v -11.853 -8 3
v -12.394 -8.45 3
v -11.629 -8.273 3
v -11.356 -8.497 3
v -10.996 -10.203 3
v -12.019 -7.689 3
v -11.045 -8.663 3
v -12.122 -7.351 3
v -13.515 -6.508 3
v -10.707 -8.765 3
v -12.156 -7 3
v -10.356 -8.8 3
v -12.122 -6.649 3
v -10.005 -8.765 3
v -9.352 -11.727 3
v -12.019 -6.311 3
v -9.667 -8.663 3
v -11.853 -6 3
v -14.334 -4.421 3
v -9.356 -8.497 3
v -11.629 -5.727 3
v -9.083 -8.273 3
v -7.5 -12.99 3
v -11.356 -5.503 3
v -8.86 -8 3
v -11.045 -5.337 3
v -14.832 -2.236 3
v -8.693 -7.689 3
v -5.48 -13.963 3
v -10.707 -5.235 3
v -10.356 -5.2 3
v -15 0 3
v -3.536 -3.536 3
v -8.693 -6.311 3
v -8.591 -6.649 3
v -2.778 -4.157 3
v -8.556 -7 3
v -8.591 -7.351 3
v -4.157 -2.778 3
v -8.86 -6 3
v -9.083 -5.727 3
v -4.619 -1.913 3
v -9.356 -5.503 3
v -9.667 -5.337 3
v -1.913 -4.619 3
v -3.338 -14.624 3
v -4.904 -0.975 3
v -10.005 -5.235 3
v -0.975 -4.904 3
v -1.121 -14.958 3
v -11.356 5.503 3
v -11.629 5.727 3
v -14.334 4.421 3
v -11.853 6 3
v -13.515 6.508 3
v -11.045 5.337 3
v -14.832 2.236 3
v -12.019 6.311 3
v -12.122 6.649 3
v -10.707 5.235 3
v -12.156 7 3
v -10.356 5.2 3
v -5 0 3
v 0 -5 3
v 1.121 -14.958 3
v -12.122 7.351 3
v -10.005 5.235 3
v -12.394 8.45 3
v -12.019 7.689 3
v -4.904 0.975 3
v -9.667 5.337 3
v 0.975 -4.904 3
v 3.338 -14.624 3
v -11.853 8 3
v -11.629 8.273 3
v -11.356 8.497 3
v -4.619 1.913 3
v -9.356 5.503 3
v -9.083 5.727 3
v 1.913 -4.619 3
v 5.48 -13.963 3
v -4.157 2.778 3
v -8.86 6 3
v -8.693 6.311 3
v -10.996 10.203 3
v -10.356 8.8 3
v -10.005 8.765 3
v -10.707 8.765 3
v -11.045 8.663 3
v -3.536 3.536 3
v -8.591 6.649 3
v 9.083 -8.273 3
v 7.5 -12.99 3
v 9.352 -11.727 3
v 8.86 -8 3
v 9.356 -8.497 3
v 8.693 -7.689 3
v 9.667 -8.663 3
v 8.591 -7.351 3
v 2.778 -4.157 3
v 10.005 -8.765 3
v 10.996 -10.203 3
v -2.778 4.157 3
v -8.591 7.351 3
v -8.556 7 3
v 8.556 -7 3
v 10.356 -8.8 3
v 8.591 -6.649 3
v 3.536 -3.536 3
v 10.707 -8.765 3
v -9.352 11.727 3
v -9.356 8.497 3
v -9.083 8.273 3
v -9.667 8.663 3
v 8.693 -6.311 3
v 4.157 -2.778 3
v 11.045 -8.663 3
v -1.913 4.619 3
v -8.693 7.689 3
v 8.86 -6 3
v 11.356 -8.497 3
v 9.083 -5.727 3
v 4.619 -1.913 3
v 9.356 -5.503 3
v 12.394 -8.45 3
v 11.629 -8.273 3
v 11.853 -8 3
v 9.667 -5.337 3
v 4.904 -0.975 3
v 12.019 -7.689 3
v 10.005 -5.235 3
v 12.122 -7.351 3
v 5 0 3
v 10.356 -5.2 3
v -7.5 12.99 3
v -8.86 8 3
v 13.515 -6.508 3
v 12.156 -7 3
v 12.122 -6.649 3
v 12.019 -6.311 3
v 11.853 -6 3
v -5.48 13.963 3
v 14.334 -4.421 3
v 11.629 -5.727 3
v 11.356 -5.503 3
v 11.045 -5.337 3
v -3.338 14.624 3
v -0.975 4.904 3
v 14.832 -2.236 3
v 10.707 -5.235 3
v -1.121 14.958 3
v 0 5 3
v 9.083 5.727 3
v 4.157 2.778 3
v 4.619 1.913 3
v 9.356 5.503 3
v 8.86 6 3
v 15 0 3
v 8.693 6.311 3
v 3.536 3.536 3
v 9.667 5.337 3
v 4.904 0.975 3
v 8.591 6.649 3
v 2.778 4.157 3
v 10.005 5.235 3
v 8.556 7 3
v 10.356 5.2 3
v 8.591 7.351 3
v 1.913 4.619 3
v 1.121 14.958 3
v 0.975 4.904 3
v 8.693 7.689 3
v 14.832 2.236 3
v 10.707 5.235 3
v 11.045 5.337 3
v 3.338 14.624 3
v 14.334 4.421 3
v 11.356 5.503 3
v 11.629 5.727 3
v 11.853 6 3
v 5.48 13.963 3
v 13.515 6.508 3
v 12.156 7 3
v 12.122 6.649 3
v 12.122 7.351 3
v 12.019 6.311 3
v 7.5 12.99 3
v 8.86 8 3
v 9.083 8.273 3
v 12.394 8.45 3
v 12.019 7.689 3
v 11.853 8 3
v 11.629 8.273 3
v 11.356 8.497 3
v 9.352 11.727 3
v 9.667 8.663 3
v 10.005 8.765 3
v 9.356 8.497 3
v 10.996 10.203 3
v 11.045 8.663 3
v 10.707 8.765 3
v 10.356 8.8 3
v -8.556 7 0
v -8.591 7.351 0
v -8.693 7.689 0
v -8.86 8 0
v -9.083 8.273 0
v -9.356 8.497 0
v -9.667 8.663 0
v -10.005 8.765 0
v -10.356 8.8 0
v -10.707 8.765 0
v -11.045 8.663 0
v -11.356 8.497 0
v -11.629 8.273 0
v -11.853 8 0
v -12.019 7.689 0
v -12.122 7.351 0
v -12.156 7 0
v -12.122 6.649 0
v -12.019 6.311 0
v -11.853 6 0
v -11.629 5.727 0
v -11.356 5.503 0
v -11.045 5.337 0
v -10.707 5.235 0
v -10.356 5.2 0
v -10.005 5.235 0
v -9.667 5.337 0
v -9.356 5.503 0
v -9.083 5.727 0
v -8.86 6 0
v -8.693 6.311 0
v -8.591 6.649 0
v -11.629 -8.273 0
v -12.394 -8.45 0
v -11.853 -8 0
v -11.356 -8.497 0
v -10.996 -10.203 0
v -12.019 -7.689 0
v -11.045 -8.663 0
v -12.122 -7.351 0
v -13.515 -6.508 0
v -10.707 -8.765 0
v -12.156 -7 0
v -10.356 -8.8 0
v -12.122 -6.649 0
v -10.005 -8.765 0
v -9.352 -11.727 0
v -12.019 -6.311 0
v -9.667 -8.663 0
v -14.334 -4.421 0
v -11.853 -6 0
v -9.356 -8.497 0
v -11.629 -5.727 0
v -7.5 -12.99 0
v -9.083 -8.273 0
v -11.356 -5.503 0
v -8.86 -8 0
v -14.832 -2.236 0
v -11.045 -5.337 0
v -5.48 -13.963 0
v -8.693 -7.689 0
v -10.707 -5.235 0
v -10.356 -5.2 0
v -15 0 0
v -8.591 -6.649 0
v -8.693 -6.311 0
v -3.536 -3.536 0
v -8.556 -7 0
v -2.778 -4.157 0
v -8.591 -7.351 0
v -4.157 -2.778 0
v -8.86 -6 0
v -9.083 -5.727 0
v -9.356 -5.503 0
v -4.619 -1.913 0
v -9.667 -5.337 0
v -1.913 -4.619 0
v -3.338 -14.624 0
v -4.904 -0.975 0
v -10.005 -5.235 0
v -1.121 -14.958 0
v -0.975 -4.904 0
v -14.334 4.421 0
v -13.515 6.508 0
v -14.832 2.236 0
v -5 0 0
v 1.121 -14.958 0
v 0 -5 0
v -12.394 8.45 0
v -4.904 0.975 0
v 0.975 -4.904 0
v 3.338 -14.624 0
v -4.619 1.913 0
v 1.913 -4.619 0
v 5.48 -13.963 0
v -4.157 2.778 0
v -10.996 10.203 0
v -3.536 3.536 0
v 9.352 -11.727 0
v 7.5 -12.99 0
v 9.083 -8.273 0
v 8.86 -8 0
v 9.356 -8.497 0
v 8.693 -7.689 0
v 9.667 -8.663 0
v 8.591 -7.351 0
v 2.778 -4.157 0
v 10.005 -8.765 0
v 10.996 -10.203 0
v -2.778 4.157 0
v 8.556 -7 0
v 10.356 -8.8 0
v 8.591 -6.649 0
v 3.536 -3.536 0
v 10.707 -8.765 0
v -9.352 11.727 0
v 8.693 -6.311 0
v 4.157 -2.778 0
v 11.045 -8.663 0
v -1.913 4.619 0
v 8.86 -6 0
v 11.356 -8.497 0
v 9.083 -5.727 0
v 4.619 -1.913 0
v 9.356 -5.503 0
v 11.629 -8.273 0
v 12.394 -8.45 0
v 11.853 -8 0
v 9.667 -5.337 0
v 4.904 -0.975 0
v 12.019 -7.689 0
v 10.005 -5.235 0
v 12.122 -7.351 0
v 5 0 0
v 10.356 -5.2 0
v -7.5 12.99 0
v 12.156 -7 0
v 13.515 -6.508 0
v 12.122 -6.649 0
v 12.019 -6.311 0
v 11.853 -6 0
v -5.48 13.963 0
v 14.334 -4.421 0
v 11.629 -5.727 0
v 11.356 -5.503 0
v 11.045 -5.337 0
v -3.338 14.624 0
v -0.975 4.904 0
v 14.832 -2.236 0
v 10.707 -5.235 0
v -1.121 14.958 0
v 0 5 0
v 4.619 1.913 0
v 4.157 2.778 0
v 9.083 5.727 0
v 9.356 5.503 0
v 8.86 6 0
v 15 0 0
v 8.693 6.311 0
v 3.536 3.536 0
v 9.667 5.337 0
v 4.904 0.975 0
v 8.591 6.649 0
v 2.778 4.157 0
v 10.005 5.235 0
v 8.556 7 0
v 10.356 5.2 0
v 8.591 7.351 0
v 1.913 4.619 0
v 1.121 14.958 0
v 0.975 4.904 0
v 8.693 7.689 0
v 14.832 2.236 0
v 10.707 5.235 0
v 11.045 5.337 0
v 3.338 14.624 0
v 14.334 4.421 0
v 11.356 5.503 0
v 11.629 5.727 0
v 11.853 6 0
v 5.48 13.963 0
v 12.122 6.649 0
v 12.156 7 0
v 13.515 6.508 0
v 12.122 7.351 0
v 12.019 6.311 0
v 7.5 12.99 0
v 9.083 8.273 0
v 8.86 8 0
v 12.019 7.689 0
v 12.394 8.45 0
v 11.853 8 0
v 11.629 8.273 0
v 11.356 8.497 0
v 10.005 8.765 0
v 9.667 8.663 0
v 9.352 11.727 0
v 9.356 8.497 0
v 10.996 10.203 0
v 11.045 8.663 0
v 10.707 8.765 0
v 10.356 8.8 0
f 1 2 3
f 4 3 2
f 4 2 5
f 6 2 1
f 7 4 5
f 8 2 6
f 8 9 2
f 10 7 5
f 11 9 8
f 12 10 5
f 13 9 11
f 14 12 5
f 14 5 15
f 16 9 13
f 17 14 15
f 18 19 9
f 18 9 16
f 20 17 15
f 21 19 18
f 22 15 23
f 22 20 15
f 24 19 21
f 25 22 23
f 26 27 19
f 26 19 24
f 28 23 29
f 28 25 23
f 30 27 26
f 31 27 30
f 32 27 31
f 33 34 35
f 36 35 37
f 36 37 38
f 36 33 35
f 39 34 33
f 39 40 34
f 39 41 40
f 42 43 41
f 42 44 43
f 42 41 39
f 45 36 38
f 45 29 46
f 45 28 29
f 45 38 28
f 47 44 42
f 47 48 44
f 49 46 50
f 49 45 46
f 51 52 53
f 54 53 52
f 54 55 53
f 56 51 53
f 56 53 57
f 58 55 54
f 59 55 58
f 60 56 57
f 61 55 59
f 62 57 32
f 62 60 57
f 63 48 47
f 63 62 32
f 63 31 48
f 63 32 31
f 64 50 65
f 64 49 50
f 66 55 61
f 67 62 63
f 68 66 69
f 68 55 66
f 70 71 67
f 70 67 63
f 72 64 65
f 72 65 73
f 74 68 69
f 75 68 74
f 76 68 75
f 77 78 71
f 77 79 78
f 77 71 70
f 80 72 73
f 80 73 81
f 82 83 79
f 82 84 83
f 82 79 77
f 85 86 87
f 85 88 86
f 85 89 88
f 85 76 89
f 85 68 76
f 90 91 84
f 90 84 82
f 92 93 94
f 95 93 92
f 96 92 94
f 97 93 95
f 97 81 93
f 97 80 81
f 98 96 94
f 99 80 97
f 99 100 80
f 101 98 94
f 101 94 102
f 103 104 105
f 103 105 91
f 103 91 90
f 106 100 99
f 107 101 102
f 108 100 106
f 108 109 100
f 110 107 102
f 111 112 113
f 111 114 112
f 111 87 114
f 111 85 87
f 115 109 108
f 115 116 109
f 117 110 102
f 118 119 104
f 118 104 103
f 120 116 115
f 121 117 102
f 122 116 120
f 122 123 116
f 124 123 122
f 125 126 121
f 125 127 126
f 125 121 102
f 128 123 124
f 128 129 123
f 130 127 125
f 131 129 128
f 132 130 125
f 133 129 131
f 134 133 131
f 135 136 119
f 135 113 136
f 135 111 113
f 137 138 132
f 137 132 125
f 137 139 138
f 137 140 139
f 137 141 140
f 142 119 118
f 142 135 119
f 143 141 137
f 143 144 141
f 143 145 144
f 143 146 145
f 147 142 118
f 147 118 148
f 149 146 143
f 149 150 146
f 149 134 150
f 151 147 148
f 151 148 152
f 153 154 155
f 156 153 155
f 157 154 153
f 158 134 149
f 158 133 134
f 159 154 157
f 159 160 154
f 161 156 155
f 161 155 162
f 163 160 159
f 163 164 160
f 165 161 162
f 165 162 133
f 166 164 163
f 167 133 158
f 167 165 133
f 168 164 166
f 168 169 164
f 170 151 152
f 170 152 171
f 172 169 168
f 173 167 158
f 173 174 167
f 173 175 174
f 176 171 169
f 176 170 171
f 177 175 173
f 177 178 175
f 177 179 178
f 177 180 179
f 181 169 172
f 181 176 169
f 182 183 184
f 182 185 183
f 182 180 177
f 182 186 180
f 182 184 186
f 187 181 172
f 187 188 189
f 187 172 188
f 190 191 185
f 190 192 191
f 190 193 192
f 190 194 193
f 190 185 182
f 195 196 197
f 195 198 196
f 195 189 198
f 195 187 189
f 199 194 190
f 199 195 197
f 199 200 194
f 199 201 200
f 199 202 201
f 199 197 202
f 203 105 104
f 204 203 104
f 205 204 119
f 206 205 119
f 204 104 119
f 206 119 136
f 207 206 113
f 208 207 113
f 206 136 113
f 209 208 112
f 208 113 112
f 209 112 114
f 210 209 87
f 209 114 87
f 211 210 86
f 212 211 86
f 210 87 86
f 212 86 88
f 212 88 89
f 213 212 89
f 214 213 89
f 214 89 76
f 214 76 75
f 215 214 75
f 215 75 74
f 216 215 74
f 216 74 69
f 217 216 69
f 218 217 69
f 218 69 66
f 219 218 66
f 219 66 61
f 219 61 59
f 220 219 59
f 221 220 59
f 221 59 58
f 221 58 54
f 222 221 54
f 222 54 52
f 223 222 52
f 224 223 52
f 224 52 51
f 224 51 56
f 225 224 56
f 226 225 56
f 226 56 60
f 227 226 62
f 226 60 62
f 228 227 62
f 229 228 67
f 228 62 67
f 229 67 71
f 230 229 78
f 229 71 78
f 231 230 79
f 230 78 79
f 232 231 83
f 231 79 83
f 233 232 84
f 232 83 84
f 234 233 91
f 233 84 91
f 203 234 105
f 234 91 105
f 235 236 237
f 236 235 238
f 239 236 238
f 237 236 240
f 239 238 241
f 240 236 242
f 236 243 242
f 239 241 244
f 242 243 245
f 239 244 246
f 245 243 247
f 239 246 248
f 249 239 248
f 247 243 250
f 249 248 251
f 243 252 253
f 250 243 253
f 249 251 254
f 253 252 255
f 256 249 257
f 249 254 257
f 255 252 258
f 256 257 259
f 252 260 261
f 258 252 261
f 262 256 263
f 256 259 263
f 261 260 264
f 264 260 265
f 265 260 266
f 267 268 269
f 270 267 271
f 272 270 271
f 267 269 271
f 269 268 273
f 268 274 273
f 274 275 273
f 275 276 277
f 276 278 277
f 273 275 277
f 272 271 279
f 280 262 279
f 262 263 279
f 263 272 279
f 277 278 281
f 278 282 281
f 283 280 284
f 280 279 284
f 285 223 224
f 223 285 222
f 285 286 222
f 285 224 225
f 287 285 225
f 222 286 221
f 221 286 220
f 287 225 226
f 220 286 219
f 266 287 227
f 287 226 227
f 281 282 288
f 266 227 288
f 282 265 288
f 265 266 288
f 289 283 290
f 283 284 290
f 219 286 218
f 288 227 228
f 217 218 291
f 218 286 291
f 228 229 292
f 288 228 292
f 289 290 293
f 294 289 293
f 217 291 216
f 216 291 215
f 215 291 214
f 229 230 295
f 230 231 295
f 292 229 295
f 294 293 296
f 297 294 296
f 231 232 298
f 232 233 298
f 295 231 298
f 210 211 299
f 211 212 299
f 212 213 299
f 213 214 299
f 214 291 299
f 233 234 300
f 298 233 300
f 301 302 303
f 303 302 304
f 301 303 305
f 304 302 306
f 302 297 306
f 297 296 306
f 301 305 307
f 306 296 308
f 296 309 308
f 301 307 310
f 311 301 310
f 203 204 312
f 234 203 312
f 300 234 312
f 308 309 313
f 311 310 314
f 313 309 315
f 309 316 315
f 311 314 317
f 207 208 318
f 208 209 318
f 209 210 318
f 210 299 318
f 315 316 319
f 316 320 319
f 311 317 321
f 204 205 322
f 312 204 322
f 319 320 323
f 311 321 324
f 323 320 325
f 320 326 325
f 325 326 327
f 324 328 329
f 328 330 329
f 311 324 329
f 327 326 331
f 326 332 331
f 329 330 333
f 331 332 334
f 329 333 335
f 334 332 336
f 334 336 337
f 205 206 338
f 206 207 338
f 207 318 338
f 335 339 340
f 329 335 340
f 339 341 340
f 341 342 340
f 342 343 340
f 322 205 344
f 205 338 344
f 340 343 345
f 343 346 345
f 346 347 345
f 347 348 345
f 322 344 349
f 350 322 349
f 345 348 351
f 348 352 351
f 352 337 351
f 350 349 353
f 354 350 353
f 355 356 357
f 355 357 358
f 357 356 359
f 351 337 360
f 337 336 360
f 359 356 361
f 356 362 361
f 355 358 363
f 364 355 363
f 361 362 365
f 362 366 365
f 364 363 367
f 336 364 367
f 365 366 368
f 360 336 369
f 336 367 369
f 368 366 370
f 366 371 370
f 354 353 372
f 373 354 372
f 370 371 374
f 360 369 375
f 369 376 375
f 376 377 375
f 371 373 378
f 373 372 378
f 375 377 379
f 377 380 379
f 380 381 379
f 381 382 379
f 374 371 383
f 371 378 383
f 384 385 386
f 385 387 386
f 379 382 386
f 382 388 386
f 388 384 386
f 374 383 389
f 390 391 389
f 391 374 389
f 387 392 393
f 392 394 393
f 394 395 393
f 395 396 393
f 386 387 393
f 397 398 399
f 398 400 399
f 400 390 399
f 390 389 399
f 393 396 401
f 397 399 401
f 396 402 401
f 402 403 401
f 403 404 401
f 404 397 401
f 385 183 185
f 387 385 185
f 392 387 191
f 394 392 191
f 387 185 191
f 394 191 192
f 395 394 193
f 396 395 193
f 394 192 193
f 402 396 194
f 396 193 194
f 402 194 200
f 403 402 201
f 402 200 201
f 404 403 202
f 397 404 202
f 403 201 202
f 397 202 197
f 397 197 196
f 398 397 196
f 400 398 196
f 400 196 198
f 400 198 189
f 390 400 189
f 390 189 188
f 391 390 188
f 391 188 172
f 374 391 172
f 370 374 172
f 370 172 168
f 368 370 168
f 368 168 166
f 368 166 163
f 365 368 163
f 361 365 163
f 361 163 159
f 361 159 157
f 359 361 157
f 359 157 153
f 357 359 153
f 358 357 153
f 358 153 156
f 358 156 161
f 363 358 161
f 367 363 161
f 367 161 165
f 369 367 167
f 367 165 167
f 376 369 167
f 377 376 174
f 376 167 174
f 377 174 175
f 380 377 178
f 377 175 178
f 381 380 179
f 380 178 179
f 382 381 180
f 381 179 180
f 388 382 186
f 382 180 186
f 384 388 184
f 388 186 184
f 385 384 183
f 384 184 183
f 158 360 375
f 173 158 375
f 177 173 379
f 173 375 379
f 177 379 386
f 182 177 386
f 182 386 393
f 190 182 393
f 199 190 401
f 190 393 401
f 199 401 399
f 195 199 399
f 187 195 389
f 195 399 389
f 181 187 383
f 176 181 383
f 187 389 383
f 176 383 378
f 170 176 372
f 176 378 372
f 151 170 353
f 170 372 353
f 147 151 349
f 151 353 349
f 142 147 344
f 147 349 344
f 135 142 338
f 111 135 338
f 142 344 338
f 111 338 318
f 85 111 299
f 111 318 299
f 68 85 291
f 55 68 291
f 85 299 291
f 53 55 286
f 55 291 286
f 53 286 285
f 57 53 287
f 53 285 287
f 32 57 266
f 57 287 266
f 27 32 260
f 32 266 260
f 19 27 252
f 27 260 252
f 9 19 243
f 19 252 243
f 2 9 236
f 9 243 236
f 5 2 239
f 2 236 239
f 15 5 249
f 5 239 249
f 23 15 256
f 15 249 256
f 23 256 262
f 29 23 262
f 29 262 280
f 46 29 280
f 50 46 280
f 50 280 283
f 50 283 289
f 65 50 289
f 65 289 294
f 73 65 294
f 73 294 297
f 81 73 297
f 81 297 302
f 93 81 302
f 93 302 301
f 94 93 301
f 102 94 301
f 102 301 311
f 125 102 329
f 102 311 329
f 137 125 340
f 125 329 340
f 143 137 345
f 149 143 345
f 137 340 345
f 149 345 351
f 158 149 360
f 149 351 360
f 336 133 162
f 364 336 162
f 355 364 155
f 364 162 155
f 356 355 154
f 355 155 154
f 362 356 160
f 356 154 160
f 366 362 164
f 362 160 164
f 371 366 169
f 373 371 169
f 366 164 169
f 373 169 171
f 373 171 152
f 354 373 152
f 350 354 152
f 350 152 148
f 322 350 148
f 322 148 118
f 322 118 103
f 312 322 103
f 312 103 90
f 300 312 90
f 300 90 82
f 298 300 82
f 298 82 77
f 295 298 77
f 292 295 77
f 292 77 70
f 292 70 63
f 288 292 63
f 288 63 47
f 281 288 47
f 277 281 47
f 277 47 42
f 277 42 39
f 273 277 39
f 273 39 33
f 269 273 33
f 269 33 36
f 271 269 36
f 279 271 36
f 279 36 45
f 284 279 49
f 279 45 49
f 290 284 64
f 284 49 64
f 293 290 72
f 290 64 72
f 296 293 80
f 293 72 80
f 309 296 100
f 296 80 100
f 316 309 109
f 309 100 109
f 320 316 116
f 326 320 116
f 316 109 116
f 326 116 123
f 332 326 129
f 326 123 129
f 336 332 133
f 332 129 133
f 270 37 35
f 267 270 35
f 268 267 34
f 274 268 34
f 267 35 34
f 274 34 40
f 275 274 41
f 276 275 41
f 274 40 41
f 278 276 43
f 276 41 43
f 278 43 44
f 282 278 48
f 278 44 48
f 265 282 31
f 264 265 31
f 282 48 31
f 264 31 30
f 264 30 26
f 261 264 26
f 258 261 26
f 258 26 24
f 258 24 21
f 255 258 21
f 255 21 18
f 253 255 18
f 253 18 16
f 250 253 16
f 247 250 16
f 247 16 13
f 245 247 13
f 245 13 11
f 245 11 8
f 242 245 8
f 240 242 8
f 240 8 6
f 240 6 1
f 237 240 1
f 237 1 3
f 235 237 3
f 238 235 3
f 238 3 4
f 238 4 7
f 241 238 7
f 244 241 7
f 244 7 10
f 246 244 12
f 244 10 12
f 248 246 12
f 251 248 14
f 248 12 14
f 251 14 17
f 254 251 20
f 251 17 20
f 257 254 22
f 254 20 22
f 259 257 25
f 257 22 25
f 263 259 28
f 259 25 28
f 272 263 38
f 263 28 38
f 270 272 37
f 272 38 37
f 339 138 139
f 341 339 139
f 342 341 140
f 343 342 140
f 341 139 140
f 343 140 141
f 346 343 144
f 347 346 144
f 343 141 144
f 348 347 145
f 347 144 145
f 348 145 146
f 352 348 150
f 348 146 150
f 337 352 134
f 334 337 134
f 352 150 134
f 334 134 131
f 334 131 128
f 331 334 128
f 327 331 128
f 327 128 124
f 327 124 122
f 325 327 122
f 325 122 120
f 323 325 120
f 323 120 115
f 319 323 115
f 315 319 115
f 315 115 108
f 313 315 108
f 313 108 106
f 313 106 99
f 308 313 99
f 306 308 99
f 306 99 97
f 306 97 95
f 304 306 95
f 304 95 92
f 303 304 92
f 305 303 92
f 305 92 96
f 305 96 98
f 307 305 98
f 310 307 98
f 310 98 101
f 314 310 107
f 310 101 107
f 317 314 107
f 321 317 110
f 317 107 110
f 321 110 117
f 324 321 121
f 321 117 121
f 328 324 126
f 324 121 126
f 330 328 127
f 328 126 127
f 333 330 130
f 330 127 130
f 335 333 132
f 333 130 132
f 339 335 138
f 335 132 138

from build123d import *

# Parameters (mm, degrees)
SKETCH_1_R          = 15
EXTRUDE_1_DEPTH     = 3
CUT_EXTRUDE_1_REACH = 23.424
SKETCH_2_R          = 5
CUT_EXTRUDE_2_REACH = 23.424
SKETCH_3_R          = 1.8


with BuildPart() as part:
    # 草图1 → 凸台-拉伸1 (new body)
    with BuildSketch(Plane.XY):
        Circle(SKETCH_1_R)
    extrude(amount=EXTRUDE_1_DEPTH)

    # 草图2 → 切除-拉伸1 (cut, up to next)
    with BuildSketch(Plane.XY.offset(3), mode=Mode.PRIVATE) as cut_extrude_1_sk1:
        Circle(SKETCH_2_R)
    cut_extrude_1_tool1 = extrude(cut_extrude_1_sk1.sketch, amount=-CUT_EXTRUDE_1_REACH, mode=Mode.PRIVATE) & part.part
    add(cut_extrude_1_tool1.solids().sort_by_distance((0, 0, 3))[0], mode=Mode.SUBTRACT)

    # 草图3 → 切除-拉伸2 (cut, up to next)
    with BuildSketch(Plane.XY.offset(3), mode=Mode.PRIVATE) as cut_extrude_2_sk1:
        with Locations((-10.356157589, -7)):
            Circle(SKETCH_3_R)
    cut_extrude_2_tool1 = extrude(cut_extrude_2_sk1.sketch, amount=-CUT_EXTRUDE_2_REACH, mode=Mode.PRIVATE) & part.part
    # 草图3 → 切除-拉伸2 (cut, up to next)
    with BuildSketch(Plane.XY.offset(3), mode=Mode.PRIVATE) as cut_extrude_2_sk2:
        with Locations((10.356157589, -7)):
            Circle(SKETCH_3_R)
    cut_extrude_2_tool2 = extrude(cut_extrude_2_sk2.sketch, amount=-CUT_EXTRUDE_2_REACH, mode=Mode.PRIVATE) & part.part
    # 草图3 → 切除-拉伸2 (cut, up to next)
    with BuildSketch(Plane.XY.offset(3), mode=Mode.PRIVATE) as cut_extrude_2_sk3:
        with Locations((10.356157589, 7)):
            Circle(SKETCH_3_R)
    cut_extrude_2_tool3 = extrude(cut_extrude_2_sk3.sketch, amount=-CUT_EXTRUDE_2_REACH, mode=Mode.PRIVATE) & part.part
    # 草图3 → 切除-拉伸2 (cut, up to next)
    with BuildSketch(Plane.XY.offset(3), mode=Mode.PRIVATE) as cut_extrude_2_sk4:
        with Locations((-10.356157589, 7)):
            Circle(SKETCH_3_R)
    cut_extrude_2_tool4 = extrude(cut_extrude_2_sk4.sketch, amount=-CUT_EXTRUDE_2_REACH, mode=Mode.PRIVATE) & part.part
    add(cut_extrude_2_tool1.solids().sort_by_distance((-10.356158, -7, 3))[0], mode=Mode.SUBTRACT)
    add(cut_extrude_2_tool2.solids().sort_by_distance((10.356158, -7, 3))[0], mode=Mode.SUBTRACT)
    add(cut_extrude_2_tool3.solids().sort_by_distance((10.356158, 7, 3))[0], mode=Mode.SUBTRACT)
    add(cut_extrude_2_tool4.solids().sort_by_distance((-10.356158, 7, 3))[0], mode=Mode.SUBTRACT)


solid = part.part
